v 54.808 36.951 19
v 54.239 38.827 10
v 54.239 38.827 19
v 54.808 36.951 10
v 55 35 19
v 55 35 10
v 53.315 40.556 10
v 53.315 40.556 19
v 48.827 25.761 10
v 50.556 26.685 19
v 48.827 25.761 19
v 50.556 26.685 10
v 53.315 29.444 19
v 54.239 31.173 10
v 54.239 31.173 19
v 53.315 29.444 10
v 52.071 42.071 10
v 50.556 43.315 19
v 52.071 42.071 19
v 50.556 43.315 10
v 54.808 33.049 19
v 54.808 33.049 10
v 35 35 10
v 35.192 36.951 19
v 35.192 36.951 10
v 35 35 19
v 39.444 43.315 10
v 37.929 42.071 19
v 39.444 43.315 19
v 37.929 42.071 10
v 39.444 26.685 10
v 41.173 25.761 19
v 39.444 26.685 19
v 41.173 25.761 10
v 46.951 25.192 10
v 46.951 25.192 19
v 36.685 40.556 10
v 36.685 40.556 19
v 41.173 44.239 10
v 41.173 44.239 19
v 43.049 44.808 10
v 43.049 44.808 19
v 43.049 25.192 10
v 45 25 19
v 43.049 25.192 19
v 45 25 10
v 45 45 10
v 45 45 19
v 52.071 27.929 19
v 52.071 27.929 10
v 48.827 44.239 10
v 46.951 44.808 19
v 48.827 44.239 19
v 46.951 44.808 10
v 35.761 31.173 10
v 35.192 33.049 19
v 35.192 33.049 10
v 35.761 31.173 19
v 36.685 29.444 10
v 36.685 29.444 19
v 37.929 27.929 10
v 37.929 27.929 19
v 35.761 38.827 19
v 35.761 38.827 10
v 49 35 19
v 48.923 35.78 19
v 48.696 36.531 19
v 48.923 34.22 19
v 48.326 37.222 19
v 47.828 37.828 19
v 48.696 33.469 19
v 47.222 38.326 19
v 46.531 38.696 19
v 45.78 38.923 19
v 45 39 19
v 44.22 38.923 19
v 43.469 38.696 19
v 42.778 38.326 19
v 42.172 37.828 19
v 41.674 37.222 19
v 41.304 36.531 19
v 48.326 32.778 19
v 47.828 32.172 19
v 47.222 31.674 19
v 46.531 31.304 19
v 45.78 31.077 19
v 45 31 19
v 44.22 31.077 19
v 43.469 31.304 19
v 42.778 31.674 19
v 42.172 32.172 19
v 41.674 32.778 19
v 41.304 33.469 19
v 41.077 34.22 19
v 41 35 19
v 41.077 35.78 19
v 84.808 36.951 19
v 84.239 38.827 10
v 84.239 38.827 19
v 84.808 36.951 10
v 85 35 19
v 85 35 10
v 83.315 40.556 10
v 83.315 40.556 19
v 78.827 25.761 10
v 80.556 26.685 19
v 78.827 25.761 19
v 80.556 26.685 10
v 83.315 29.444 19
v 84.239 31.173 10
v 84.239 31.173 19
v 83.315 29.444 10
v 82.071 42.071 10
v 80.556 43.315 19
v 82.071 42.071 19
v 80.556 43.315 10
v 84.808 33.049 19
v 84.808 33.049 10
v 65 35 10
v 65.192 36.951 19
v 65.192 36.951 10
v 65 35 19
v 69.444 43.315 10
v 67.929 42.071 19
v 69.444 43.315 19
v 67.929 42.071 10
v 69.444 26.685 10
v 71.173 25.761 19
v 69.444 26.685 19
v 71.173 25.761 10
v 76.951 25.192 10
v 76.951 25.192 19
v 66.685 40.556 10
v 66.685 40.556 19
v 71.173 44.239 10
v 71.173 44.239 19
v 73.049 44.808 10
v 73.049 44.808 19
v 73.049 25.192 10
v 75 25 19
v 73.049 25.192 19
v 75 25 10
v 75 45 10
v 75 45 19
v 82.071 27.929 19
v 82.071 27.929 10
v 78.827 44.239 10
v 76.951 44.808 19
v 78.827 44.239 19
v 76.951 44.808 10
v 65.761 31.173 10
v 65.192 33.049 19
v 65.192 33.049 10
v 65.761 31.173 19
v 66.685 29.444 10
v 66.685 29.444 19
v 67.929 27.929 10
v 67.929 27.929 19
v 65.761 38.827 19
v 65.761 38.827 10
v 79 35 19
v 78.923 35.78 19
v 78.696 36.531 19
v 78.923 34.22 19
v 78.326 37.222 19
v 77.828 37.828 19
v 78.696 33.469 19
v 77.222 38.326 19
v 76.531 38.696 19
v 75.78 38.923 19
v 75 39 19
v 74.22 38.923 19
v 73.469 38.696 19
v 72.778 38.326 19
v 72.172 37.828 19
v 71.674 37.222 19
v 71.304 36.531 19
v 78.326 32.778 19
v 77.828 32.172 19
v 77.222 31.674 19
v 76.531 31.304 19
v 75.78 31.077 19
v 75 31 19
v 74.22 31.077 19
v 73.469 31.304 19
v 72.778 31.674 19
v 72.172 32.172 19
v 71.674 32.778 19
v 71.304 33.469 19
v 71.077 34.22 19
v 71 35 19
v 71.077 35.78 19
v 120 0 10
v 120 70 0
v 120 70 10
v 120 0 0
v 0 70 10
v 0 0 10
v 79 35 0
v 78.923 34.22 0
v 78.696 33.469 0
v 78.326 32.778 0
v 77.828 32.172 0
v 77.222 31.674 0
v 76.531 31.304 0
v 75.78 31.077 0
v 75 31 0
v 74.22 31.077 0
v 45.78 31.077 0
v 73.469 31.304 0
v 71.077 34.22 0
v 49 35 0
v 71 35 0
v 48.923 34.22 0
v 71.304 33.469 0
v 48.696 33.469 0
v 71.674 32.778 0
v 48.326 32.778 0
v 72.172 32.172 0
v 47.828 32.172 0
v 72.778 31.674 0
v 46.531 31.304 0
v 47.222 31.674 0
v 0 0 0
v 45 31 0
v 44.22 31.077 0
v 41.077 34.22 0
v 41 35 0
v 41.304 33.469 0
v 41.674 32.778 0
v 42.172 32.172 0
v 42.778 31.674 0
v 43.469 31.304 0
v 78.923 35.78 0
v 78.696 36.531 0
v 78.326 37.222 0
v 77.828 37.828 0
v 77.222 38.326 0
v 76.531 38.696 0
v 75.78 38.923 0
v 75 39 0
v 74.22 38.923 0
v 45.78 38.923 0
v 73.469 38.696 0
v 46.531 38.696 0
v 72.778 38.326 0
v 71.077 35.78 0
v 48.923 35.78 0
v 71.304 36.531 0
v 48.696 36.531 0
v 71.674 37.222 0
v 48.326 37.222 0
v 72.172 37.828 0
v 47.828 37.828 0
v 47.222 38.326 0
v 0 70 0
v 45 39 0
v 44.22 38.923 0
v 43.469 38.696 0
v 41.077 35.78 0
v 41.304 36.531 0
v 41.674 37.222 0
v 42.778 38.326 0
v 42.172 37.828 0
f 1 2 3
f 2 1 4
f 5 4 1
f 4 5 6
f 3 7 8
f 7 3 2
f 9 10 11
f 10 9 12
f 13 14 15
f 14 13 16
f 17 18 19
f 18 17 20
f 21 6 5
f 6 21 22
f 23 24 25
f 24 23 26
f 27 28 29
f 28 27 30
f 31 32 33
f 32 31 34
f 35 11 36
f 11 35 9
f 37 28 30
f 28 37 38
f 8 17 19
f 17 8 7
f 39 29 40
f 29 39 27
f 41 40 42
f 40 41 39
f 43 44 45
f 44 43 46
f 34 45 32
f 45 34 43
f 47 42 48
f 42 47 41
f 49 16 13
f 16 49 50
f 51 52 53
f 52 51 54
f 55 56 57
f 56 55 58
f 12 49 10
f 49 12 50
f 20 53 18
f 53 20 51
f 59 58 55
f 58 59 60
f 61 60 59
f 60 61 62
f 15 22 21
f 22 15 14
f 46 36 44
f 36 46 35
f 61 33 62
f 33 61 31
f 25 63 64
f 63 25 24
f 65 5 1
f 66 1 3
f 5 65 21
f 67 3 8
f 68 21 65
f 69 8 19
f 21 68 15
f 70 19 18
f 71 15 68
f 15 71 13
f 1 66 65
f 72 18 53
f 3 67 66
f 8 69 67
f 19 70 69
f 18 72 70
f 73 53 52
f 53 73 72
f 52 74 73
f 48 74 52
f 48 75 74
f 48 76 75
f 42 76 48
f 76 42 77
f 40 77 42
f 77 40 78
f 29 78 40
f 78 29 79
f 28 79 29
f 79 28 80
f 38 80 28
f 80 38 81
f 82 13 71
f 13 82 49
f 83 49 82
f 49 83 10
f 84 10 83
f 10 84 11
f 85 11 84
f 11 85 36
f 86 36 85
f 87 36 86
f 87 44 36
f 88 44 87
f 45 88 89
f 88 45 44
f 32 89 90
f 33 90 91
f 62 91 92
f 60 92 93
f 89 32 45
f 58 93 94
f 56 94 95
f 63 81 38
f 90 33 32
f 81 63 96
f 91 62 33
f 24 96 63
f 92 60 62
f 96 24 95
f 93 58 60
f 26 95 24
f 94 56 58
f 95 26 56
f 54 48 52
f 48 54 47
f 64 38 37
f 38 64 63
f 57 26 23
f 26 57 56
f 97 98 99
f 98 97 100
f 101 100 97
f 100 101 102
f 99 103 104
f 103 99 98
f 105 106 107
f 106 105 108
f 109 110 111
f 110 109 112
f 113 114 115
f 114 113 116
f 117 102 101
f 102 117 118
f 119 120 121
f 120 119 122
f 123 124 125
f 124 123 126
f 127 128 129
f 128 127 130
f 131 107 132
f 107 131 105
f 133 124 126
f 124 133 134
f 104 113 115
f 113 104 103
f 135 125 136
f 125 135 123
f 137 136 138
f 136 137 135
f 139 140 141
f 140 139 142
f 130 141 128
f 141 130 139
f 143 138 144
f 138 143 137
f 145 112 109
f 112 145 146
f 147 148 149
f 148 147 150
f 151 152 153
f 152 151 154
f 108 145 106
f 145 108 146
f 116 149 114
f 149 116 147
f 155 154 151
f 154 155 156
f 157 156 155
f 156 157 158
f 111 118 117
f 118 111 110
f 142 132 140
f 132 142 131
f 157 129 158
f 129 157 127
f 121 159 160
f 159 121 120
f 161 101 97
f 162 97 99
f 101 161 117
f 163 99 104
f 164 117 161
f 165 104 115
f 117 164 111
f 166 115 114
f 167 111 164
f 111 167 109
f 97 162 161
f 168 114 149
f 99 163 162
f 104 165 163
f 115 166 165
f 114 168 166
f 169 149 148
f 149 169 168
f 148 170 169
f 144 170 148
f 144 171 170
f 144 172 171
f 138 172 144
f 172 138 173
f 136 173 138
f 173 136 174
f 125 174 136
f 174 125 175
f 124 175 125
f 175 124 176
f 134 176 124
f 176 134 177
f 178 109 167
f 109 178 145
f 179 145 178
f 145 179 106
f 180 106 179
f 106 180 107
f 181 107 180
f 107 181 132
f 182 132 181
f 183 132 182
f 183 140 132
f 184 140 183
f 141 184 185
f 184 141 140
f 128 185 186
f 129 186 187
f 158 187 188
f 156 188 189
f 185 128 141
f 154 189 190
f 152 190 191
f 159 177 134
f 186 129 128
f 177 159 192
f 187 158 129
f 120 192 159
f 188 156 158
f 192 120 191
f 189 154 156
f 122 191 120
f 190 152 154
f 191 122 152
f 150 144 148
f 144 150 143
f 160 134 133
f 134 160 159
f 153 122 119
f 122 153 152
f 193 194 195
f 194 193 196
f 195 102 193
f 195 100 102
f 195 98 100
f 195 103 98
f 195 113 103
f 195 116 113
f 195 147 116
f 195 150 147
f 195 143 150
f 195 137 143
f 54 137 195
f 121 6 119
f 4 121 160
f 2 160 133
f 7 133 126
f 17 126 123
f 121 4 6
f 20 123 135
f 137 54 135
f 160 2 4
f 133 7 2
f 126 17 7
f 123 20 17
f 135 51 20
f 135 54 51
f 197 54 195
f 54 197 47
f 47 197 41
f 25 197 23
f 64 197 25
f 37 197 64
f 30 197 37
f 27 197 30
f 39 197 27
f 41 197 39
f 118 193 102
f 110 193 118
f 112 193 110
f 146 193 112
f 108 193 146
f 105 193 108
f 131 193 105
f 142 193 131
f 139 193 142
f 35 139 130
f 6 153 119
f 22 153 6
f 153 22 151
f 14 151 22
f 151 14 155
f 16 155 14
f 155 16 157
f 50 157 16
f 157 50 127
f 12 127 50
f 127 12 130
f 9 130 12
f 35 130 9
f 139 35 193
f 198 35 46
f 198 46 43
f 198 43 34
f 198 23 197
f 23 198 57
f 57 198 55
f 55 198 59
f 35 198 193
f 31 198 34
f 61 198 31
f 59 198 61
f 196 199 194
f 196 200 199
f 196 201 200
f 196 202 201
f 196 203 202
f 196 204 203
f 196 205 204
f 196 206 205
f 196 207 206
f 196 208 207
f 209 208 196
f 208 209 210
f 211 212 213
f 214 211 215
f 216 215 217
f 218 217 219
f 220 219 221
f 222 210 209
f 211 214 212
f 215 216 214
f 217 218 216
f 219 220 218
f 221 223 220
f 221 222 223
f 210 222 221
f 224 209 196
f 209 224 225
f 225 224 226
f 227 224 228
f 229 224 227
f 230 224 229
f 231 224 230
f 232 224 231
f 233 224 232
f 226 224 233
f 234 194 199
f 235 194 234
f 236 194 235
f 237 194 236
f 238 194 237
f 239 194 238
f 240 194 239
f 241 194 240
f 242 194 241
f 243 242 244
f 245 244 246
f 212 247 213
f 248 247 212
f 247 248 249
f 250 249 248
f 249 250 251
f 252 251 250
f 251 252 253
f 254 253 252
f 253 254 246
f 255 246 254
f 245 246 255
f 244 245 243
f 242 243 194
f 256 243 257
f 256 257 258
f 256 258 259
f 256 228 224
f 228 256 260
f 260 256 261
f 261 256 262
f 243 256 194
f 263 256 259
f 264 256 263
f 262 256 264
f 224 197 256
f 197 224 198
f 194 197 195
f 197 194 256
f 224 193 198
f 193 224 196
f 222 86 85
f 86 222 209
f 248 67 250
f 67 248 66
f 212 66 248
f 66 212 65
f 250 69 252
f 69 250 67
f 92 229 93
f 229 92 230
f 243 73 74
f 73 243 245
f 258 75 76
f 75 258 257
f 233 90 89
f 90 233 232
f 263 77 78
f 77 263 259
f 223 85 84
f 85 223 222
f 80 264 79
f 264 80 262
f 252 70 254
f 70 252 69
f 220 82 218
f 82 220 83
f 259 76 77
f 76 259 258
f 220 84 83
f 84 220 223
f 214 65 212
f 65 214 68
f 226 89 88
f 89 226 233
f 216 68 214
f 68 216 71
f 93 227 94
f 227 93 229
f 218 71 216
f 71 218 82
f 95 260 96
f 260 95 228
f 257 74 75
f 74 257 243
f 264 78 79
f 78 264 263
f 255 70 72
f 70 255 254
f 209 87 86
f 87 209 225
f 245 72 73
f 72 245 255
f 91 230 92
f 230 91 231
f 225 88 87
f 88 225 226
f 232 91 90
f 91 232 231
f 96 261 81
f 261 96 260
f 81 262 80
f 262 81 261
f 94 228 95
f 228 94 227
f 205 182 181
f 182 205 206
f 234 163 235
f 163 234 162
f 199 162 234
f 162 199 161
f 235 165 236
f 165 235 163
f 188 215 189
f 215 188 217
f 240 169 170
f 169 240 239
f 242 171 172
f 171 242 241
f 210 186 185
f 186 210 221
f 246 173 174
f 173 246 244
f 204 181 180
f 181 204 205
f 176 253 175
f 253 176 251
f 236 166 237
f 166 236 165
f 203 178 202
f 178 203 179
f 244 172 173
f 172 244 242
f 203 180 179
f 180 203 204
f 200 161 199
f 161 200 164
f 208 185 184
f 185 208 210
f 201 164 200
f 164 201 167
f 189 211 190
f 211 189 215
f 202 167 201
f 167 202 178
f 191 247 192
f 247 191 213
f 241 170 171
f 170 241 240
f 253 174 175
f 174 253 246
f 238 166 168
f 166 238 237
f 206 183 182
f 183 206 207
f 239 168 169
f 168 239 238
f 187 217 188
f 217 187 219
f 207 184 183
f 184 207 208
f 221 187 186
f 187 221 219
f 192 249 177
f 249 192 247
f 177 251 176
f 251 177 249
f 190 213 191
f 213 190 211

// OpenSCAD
$fn = 32;

// ----------------------------------------------------------------------
// Drill jig: two_boss jig
// ----------------------------------------------------------------------

// --- parameters (mm) ---
plate_l = 120;            // plate length, X
plate_w = 70;             // plate width, Y
plate_t = 10;             // plate thickness
boss_d = 20;              // guide boss diameter
boss_h = 10;              // boss height above the plate
guide_d = 8;              // guide hole diameter
boss_pitch = 30;          // boss pitch

n_boss = 2;  // guide bosses
boss_x0 = (plate_l - (n_boss - 1) * boss_pitch) / 2;  // first boss X
boss_top = plate_t - 1 + boss_h;  // boss crown height
total_h = boss_top;  // overall height

difference() {
  union() {
  cube([plate_l, plate_w, plate_t]);
  for (i = [0 : n_boss - 1])
    translate([boss_x0 + i * boss_pitch, plate_w / 2, plate_t - 1])
      cylinder(h = boss_h, d = boss_d);
  }
  for (i = [0 : n_boss - 1])
    translate([boss_x0 + i * boss_pitch, plate_w / 2, -1])
      cylinder(h = plate_t + boss_h, d = guide_d);
}
